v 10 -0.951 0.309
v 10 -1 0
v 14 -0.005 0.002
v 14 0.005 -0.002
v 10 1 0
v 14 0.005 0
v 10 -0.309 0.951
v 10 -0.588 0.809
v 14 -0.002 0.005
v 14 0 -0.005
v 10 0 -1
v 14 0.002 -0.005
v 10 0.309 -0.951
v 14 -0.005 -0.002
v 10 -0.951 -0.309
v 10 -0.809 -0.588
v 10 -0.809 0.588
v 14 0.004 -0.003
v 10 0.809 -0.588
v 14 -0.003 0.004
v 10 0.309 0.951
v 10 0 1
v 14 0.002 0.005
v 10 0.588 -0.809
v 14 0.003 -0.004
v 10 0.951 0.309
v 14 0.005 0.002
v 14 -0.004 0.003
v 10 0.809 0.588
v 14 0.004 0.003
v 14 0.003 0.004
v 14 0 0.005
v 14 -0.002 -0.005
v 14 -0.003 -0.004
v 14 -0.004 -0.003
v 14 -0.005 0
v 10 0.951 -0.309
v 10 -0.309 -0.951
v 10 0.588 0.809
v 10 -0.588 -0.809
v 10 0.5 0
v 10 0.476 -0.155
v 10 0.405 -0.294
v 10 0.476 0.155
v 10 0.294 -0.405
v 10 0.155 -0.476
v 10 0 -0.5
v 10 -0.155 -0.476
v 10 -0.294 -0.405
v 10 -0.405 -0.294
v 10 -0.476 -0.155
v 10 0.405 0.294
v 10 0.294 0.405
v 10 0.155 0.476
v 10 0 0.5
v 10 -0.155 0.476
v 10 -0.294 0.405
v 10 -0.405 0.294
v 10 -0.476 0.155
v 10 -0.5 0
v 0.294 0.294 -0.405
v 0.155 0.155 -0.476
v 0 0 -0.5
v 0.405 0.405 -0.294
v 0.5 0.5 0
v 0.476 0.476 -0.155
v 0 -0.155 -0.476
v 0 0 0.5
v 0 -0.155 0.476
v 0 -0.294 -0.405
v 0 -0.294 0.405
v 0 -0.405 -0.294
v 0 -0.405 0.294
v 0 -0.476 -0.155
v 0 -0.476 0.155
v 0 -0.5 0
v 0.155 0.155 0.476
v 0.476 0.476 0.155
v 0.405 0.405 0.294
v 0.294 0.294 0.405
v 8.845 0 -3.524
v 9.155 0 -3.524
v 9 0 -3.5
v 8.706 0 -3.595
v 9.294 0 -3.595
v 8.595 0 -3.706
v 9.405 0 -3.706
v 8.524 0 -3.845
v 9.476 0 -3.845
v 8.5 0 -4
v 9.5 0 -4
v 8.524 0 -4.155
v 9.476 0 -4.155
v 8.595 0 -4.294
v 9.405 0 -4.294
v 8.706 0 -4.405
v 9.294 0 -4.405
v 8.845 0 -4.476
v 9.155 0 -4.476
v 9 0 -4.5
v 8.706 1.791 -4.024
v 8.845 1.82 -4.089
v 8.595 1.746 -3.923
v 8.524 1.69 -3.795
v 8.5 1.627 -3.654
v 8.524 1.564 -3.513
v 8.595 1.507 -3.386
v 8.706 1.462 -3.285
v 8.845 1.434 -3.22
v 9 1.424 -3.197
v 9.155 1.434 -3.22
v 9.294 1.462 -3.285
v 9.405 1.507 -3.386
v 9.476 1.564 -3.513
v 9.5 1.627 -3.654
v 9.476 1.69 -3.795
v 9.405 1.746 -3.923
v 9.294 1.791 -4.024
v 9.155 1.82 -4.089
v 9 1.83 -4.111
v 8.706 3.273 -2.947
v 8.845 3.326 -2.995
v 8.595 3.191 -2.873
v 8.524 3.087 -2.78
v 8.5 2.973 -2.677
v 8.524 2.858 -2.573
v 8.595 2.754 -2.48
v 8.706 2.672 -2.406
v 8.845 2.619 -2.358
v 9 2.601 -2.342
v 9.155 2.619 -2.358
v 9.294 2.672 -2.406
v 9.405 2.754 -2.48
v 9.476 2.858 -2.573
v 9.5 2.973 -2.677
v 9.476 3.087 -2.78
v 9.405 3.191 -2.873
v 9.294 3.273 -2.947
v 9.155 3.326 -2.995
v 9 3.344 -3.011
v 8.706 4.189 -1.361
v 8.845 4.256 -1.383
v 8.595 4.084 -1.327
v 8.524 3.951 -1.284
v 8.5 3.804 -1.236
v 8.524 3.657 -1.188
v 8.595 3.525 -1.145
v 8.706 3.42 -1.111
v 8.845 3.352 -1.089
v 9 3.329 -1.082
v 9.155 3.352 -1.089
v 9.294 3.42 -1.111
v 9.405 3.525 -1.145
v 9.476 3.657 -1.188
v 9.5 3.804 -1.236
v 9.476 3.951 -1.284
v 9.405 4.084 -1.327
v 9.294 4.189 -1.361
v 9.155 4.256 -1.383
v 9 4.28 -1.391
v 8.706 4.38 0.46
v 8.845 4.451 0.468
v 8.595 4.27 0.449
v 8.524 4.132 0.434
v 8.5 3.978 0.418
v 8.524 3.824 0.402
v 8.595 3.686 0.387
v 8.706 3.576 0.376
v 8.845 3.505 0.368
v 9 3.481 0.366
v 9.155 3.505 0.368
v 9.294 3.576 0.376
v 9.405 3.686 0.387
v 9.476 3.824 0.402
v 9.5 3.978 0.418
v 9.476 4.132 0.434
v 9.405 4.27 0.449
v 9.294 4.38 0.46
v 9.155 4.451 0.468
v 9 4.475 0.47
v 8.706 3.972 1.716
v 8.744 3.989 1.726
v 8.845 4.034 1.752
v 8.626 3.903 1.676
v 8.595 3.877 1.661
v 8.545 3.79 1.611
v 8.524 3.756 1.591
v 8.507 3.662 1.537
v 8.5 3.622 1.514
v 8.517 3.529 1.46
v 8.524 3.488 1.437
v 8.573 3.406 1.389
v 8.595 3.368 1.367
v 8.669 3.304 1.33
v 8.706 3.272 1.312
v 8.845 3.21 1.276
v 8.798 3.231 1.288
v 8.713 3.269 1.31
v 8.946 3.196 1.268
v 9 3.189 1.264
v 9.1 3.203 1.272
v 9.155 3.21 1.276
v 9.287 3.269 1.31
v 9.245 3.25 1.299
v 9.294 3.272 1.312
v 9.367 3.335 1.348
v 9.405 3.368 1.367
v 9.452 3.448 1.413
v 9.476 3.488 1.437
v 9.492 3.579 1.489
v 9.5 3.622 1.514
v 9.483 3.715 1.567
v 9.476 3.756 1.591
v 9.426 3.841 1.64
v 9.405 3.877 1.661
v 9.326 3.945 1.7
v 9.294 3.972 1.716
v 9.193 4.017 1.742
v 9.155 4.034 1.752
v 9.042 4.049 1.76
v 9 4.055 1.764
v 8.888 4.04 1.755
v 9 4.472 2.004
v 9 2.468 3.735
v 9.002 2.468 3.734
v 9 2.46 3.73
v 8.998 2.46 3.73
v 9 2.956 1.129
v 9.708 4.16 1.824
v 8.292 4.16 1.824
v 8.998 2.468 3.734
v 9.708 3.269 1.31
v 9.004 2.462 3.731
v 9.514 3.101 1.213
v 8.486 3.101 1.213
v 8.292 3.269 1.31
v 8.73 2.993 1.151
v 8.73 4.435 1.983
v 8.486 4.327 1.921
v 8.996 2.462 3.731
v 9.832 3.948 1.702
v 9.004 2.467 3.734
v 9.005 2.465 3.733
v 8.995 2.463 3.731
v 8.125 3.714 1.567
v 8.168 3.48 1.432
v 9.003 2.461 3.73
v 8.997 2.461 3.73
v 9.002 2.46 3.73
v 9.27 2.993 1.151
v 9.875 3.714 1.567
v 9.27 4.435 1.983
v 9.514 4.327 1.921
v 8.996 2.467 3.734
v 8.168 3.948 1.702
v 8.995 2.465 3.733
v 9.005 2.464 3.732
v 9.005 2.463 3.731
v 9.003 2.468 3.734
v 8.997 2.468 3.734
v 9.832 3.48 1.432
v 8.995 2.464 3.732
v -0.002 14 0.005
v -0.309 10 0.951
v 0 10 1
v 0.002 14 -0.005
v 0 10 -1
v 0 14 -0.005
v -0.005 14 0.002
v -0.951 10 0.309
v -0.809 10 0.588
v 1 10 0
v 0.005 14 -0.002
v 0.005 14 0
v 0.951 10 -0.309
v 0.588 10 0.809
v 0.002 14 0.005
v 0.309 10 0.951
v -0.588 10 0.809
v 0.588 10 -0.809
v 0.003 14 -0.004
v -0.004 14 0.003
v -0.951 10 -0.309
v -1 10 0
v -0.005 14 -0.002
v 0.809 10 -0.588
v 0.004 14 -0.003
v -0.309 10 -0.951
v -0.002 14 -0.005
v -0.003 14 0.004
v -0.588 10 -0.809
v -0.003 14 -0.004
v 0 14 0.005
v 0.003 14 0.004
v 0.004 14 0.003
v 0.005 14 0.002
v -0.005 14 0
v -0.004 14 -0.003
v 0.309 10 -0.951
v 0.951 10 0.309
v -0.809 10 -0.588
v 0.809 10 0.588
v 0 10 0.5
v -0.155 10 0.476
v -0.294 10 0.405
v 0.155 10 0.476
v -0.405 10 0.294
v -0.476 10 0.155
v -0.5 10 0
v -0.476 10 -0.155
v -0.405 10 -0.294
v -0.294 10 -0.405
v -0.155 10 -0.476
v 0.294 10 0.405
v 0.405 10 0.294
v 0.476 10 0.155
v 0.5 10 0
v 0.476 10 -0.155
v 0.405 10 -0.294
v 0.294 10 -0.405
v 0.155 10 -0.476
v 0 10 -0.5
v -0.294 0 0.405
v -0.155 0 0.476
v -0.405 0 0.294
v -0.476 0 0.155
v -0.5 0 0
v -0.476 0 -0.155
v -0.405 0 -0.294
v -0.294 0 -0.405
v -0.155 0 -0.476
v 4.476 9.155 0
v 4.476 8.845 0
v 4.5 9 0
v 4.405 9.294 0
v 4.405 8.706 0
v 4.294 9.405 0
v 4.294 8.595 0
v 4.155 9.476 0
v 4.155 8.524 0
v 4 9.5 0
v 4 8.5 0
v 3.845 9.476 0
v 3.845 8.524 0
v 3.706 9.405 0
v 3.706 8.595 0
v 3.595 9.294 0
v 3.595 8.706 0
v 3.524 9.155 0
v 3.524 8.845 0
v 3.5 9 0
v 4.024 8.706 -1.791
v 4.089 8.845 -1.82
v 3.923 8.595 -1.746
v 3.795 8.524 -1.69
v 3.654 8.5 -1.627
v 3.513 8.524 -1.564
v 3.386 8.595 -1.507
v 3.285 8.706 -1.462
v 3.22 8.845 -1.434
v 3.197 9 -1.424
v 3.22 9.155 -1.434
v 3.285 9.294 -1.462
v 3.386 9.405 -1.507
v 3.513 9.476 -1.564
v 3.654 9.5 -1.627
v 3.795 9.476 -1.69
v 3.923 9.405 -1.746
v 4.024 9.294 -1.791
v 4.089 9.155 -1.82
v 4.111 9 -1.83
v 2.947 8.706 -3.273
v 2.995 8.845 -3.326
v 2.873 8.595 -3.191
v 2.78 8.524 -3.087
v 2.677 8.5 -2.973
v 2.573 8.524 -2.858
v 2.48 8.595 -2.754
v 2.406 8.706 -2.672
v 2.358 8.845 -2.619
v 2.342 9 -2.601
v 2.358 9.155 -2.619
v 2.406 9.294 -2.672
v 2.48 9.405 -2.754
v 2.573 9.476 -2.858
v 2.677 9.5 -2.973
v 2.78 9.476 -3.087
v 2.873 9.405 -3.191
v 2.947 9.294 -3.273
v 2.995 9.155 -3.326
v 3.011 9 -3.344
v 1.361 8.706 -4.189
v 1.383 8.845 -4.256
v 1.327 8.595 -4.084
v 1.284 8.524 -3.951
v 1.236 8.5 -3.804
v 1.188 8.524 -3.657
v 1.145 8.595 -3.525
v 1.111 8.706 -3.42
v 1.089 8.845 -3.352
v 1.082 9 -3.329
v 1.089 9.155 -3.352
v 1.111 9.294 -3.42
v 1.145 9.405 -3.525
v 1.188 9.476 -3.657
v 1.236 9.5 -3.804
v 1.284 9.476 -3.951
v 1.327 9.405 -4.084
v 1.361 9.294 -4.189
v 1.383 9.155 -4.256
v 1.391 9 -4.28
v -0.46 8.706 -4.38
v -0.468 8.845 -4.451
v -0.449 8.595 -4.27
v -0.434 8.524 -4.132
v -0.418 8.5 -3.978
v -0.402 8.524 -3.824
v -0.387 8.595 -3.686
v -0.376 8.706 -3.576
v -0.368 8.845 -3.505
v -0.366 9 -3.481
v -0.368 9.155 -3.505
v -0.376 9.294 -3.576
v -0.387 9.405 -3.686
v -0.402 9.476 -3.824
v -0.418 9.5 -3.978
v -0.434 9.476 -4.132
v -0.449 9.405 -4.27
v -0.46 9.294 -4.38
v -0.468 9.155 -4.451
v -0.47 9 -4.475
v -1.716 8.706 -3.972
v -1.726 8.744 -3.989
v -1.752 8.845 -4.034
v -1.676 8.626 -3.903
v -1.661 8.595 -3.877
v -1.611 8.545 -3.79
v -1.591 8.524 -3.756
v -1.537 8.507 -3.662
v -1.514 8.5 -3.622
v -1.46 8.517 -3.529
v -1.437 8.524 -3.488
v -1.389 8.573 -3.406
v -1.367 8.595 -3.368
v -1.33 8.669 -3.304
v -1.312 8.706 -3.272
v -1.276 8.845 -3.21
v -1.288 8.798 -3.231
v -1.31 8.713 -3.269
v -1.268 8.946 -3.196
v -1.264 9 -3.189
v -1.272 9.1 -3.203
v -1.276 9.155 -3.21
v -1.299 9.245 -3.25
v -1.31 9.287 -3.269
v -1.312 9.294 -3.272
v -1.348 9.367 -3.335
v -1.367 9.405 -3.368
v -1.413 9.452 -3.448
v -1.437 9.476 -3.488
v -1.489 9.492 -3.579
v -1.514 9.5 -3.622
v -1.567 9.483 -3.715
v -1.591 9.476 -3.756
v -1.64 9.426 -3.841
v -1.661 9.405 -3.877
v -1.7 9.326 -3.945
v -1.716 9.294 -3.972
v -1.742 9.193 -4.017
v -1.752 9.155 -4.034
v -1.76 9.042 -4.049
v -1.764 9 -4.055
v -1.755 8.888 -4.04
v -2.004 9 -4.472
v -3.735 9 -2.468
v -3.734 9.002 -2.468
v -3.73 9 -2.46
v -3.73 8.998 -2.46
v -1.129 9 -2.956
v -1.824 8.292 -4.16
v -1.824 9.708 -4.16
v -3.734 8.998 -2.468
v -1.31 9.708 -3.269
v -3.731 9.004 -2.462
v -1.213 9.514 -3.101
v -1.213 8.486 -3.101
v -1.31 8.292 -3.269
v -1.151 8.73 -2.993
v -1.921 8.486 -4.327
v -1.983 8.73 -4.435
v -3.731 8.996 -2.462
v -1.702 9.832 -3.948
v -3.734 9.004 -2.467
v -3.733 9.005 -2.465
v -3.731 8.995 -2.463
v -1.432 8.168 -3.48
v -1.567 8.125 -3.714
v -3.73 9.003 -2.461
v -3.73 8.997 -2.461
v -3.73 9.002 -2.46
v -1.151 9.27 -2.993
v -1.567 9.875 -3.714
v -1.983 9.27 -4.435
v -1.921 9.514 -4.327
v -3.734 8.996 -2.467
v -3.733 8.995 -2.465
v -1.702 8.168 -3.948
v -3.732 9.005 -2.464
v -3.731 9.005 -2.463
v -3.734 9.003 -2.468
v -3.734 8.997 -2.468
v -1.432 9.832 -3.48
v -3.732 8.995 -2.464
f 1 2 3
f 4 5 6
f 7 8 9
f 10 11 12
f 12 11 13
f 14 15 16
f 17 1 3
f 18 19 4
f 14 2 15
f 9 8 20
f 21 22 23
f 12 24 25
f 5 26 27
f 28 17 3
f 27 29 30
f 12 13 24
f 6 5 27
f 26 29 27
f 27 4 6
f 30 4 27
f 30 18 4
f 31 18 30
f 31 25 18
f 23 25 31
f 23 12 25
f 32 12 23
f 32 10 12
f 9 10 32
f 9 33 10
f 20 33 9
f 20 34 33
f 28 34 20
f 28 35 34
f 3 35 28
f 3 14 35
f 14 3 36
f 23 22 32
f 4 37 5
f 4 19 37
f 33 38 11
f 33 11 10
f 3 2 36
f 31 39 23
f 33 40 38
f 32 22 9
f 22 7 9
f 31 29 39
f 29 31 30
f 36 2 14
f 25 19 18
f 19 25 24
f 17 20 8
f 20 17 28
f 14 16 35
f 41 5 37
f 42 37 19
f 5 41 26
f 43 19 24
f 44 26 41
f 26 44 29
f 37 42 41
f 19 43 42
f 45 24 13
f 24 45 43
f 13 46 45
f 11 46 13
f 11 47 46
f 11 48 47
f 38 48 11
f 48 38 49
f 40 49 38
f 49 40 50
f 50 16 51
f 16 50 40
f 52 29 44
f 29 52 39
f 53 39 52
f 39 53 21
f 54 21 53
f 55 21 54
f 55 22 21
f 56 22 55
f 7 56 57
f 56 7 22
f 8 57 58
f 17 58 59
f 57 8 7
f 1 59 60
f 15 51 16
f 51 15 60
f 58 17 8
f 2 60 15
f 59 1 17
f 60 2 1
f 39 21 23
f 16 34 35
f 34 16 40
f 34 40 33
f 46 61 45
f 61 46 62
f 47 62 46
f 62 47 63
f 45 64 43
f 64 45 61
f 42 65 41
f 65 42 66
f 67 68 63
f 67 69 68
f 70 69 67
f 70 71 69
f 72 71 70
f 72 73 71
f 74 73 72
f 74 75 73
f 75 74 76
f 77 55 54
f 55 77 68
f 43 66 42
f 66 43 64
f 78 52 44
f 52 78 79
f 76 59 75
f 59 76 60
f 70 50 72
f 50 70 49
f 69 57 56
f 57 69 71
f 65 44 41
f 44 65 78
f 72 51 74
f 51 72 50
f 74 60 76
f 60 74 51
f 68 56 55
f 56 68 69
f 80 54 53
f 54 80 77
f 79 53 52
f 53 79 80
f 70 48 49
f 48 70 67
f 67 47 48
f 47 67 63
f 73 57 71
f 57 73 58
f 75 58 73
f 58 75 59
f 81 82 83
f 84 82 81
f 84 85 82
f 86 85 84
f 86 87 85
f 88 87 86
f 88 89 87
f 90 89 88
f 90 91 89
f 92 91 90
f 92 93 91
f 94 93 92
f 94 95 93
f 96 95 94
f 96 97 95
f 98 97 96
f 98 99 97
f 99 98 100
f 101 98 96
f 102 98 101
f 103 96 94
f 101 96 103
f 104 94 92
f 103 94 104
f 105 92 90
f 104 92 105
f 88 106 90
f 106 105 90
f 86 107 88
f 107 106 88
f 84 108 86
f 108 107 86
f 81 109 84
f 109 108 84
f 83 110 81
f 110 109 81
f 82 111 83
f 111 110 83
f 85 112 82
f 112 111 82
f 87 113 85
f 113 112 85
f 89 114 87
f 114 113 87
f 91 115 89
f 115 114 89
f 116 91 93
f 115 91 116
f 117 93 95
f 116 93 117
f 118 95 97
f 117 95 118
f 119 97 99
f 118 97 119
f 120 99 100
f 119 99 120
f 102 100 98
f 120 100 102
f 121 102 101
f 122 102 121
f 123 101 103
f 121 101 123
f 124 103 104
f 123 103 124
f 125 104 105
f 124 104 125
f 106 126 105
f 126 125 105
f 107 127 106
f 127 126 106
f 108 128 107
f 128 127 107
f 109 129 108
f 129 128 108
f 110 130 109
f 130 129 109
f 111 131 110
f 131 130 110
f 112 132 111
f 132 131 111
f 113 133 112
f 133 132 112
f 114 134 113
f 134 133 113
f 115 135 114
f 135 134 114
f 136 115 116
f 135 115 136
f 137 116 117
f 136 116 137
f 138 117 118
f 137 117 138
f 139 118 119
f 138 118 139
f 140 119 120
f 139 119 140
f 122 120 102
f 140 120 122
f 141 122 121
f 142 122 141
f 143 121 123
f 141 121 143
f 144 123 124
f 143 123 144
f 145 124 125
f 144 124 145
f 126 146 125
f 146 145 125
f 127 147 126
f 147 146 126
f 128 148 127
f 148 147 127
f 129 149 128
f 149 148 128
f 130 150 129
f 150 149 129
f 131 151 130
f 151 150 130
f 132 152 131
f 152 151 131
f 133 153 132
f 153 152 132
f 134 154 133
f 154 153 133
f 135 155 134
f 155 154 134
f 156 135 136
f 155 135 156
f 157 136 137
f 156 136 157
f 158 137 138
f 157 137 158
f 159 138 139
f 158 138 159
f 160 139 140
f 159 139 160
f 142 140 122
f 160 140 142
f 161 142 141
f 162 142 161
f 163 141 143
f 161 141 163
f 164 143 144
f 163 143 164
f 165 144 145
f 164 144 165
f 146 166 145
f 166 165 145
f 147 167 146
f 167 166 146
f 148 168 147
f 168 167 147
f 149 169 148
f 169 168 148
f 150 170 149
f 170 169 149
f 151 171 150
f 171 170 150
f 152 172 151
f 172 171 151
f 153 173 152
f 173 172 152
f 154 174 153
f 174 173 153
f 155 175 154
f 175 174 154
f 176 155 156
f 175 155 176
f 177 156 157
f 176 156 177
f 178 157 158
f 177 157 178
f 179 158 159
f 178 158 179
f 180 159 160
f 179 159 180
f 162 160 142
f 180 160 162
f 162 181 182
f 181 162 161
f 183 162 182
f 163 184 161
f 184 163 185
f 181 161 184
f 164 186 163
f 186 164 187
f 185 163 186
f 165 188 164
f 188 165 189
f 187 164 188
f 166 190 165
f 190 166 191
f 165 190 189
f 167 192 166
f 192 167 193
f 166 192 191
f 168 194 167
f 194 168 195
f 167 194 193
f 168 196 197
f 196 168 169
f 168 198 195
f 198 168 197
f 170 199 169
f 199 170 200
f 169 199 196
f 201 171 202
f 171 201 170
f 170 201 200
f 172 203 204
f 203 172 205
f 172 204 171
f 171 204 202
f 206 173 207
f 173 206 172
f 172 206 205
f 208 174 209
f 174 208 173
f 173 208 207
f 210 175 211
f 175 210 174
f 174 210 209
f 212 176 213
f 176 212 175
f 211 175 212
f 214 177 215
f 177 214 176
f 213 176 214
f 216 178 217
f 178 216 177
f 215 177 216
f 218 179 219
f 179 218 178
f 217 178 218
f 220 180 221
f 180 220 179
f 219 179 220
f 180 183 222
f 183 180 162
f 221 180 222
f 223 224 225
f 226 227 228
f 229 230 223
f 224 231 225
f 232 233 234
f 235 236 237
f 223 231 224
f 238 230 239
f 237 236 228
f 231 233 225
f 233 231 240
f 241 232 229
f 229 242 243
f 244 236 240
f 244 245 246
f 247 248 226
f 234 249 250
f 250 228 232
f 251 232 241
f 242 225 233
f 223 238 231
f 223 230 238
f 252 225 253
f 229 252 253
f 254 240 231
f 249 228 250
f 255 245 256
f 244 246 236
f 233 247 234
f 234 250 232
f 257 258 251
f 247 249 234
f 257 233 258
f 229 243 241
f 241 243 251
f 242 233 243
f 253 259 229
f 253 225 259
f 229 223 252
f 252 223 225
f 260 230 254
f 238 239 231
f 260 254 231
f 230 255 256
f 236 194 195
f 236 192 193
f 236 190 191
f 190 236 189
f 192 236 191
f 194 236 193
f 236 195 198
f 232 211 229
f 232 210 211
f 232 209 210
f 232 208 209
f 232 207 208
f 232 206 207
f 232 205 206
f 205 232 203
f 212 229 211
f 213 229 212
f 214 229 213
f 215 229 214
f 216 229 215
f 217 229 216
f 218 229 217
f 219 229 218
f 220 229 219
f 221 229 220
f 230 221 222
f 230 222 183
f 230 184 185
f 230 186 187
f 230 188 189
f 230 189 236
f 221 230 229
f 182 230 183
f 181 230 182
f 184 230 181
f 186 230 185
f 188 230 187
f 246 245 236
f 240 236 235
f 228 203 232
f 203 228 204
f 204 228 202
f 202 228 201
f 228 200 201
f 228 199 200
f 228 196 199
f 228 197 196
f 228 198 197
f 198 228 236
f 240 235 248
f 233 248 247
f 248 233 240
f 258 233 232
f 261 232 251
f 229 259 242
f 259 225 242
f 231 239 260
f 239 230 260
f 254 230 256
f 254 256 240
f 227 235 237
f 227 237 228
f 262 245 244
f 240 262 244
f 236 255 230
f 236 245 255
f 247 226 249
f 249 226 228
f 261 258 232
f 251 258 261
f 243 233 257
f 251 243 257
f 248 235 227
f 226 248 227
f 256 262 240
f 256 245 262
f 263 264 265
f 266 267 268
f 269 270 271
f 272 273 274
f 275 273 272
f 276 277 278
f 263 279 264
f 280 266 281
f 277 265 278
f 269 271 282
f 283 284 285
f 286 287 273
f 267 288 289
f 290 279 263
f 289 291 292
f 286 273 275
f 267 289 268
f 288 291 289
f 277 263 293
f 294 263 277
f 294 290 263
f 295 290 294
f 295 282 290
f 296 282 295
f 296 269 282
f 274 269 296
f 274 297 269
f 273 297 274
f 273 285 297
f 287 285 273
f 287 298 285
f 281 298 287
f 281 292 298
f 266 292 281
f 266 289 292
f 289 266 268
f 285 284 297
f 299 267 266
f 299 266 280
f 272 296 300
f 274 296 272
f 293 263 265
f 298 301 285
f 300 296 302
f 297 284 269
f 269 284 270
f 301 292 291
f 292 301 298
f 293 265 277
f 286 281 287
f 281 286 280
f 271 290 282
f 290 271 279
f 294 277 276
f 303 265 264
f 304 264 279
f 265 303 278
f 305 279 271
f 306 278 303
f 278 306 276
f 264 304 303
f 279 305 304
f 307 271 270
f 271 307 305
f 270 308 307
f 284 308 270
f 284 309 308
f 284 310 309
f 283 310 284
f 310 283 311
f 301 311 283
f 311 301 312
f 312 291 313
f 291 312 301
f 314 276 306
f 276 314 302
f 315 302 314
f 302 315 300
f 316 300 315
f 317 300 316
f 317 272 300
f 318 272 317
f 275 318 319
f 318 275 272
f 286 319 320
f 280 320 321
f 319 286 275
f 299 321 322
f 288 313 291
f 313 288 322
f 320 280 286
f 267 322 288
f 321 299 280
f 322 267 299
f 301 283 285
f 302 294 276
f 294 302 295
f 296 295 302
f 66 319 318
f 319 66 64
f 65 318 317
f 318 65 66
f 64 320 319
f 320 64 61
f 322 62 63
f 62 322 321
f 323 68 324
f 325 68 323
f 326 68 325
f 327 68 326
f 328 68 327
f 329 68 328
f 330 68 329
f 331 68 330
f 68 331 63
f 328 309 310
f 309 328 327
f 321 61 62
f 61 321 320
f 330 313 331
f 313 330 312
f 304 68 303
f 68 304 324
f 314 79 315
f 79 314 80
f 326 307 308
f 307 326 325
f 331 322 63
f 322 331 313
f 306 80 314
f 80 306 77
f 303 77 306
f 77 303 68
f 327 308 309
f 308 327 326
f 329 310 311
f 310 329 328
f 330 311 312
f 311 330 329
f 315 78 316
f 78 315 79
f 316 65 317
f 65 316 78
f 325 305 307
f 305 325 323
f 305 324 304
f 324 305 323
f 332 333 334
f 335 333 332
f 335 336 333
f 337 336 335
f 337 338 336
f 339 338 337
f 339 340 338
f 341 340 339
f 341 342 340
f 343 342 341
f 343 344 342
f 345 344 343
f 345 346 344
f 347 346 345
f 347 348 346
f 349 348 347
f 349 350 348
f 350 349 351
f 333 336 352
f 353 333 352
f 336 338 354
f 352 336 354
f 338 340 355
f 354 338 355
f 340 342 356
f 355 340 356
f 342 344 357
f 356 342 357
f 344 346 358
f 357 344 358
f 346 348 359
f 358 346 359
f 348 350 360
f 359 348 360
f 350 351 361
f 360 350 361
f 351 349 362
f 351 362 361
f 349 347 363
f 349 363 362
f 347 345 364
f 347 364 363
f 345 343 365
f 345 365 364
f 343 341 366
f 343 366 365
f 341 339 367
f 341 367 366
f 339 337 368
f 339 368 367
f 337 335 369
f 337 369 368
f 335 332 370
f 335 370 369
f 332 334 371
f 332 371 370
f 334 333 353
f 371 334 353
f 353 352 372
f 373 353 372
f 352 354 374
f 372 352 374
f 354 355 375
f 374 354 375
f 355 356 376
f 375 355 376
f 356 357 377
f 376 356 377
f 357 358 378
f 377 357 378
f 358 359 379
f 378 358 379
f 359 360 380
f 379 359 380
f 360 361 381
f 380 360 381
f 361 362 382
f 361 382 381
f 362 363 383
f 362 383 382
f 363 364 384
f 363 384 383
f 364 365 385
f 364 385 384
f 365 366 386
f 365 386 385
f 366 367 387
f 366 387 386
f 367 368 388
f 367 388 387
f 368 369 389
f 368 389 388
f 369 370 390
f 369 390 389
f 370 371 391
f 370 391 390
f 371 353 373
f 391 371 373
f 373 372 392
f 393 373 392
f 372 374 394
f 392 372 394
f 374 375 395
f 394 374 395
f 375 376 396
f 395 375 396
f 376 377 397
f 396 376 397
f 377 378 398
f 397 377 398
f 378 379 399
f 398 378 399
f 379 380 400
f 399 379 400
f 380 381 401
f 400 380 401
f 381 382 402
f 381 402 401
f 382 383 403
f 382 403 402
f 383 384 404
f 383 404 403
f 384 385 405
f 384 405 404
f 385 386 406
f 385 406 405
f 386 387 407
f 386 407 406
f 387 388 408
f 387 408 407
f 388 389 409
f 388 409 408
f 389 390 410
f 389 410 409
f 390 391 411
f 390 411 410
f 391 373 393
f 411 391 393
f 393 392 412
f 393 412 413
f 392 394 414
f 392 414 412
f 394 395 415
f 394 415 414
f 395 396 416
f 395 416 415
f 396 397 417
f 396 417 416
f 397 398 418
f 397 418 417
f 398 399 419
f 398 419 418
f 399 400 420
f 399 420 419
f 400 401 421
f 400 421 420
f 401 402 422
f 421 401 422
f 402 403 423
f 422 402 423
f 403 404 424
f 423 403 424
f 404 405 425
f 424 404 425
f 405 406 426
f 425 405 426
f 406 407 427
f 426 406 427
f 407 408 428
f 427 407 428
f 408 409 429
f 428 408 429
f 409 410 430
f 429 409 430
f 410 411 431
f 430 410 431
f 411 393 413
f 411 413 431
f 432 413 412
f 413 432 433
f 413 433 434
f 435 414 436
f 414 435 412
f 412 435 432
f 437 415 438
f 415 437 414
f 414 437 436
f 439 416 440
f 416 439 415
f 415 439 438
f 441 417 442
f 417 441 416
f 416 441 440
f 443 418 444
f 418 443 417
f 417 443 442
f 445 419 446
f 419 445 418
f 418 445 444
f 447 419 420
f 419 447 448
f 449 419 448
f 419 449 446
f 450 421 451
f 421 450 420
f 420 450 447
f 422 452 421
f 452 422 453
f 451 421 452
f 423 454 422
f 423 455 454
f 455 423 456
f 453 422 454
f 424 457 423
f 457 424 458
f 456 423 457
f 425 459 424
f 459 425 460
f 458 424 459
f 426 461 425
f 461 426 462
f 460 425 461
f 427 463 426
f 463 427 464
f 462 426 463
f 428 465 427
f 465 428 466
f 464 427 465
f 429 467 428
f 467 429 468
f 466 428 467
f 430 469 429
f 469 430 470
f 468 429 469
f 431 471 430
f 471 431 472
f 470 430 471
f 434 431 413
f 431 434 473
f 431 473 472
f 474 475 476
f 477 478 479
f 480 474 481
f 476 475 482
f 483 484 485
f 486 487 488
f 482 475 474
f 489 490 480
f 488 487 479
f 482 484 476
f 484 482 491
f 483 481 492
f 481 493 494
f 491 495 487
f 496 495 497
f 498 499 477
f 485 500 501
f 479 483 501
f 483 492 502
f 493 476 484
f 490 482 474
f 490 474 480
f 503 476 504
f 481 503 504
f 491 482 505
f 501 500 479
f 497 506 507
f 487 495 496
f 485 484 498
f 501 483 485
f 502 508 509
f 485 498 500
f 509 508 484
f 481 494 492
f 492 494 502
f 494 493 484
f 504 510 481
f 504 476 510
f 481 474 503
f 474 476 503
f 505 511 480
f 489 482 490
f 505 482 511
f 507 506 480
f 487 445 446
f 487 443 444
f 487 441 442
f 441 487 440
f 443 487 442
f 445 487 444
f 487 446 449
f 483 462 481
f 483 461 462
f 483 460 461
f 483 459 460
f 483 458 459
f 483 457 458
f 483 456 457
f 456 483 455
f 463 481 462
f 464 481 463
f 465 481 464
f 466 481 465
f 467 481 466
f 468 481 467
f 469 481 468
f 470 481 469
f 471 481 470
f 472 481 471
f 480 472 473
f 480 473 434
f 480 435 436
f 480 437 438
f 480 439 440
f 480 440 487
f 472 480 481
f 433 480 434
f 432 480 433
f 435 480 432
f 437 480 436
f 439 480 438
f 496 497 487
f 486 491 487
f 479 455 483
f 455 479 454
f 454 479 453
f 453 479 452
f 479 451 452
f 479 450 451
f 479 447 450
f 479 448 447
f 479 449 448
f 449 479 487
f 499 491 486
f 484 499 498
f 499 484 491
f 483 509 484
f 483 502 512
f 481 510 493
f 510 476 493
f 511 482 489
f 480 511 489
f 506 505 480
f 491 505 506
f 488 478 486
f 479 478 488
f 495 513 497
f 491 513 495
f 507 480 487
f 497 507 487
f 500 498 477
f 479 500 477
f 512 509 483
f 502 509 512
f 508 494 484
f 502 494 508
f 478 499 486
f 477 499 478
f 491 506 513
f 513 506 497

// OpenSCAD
module arrow(){
   body_h = 10;
   d = 1;
   arrow_base = 2;
   arrow_head_length = 4;
   
   translate([0,0,body_h]){
   cylinder ( d1 = arrow_base, d2 = 0.01, h =arrow_head_length, $fn = 20);
   }
   cylinder( d= 1, h = body_h,$fn = 20);
}

module rotation_arrow_rhs(){
rotate_extrude(angle = 120){
   translate([4,0,0]){
      circle ( d= 1, $fn = 20);
   }
}
rotate([0,0,120]){ 

rotate([90,0,0]){
      translate([4,0,-2]){
      cylinder ( d1 = 0.01, d2 = 1.75, h =2.5, $fn = 20);
   }
}
}
}
module rotation_arrow_lhs(){
   mirror([0,1,0]){
      rotation_arrow_rhs();
   }
}




module arrow_n_rotation_arrow_rhs(){
   arrow();
translate([0,0,9]){
rotation_arrow_rhs();
}
}

module arrow_n_rotation_arrow_lhs(){
   arrow();
translate([0,0,9]){
rotation_arrow_lhs();
}
}

//arrow();
module RHR_axes(){
   color("red"){
      translate([15,-2,-2]){
         rotate([0,-90,0]){
            text("X", size = 4);
         }
      }
      rotate([0,90,0]){
         children(0);
      }
   }  
   color("green"){
      translate([-2,15,-2]){
         rotate([90,0,0]){
            text("Y", size = 4);
         }
      }
      rotate([-90,0,0]){
       children(1);
      }
   }   
   
   color("blue"){
   translate([-2,-2,15]){
       rotate([0,0,0]){
          text("Z", size = 4);
       }
   }
   rotate([0,0,0]){
      children(2);
      }
   }   
   
}


RHR_axes(){
   arrow_n_rotation_arrow_rhs(); 
   arrow_n_rotation_arrow_rhs();
   arrow_n_rotation_arrow_rhs();
}




//RHR_axes();
